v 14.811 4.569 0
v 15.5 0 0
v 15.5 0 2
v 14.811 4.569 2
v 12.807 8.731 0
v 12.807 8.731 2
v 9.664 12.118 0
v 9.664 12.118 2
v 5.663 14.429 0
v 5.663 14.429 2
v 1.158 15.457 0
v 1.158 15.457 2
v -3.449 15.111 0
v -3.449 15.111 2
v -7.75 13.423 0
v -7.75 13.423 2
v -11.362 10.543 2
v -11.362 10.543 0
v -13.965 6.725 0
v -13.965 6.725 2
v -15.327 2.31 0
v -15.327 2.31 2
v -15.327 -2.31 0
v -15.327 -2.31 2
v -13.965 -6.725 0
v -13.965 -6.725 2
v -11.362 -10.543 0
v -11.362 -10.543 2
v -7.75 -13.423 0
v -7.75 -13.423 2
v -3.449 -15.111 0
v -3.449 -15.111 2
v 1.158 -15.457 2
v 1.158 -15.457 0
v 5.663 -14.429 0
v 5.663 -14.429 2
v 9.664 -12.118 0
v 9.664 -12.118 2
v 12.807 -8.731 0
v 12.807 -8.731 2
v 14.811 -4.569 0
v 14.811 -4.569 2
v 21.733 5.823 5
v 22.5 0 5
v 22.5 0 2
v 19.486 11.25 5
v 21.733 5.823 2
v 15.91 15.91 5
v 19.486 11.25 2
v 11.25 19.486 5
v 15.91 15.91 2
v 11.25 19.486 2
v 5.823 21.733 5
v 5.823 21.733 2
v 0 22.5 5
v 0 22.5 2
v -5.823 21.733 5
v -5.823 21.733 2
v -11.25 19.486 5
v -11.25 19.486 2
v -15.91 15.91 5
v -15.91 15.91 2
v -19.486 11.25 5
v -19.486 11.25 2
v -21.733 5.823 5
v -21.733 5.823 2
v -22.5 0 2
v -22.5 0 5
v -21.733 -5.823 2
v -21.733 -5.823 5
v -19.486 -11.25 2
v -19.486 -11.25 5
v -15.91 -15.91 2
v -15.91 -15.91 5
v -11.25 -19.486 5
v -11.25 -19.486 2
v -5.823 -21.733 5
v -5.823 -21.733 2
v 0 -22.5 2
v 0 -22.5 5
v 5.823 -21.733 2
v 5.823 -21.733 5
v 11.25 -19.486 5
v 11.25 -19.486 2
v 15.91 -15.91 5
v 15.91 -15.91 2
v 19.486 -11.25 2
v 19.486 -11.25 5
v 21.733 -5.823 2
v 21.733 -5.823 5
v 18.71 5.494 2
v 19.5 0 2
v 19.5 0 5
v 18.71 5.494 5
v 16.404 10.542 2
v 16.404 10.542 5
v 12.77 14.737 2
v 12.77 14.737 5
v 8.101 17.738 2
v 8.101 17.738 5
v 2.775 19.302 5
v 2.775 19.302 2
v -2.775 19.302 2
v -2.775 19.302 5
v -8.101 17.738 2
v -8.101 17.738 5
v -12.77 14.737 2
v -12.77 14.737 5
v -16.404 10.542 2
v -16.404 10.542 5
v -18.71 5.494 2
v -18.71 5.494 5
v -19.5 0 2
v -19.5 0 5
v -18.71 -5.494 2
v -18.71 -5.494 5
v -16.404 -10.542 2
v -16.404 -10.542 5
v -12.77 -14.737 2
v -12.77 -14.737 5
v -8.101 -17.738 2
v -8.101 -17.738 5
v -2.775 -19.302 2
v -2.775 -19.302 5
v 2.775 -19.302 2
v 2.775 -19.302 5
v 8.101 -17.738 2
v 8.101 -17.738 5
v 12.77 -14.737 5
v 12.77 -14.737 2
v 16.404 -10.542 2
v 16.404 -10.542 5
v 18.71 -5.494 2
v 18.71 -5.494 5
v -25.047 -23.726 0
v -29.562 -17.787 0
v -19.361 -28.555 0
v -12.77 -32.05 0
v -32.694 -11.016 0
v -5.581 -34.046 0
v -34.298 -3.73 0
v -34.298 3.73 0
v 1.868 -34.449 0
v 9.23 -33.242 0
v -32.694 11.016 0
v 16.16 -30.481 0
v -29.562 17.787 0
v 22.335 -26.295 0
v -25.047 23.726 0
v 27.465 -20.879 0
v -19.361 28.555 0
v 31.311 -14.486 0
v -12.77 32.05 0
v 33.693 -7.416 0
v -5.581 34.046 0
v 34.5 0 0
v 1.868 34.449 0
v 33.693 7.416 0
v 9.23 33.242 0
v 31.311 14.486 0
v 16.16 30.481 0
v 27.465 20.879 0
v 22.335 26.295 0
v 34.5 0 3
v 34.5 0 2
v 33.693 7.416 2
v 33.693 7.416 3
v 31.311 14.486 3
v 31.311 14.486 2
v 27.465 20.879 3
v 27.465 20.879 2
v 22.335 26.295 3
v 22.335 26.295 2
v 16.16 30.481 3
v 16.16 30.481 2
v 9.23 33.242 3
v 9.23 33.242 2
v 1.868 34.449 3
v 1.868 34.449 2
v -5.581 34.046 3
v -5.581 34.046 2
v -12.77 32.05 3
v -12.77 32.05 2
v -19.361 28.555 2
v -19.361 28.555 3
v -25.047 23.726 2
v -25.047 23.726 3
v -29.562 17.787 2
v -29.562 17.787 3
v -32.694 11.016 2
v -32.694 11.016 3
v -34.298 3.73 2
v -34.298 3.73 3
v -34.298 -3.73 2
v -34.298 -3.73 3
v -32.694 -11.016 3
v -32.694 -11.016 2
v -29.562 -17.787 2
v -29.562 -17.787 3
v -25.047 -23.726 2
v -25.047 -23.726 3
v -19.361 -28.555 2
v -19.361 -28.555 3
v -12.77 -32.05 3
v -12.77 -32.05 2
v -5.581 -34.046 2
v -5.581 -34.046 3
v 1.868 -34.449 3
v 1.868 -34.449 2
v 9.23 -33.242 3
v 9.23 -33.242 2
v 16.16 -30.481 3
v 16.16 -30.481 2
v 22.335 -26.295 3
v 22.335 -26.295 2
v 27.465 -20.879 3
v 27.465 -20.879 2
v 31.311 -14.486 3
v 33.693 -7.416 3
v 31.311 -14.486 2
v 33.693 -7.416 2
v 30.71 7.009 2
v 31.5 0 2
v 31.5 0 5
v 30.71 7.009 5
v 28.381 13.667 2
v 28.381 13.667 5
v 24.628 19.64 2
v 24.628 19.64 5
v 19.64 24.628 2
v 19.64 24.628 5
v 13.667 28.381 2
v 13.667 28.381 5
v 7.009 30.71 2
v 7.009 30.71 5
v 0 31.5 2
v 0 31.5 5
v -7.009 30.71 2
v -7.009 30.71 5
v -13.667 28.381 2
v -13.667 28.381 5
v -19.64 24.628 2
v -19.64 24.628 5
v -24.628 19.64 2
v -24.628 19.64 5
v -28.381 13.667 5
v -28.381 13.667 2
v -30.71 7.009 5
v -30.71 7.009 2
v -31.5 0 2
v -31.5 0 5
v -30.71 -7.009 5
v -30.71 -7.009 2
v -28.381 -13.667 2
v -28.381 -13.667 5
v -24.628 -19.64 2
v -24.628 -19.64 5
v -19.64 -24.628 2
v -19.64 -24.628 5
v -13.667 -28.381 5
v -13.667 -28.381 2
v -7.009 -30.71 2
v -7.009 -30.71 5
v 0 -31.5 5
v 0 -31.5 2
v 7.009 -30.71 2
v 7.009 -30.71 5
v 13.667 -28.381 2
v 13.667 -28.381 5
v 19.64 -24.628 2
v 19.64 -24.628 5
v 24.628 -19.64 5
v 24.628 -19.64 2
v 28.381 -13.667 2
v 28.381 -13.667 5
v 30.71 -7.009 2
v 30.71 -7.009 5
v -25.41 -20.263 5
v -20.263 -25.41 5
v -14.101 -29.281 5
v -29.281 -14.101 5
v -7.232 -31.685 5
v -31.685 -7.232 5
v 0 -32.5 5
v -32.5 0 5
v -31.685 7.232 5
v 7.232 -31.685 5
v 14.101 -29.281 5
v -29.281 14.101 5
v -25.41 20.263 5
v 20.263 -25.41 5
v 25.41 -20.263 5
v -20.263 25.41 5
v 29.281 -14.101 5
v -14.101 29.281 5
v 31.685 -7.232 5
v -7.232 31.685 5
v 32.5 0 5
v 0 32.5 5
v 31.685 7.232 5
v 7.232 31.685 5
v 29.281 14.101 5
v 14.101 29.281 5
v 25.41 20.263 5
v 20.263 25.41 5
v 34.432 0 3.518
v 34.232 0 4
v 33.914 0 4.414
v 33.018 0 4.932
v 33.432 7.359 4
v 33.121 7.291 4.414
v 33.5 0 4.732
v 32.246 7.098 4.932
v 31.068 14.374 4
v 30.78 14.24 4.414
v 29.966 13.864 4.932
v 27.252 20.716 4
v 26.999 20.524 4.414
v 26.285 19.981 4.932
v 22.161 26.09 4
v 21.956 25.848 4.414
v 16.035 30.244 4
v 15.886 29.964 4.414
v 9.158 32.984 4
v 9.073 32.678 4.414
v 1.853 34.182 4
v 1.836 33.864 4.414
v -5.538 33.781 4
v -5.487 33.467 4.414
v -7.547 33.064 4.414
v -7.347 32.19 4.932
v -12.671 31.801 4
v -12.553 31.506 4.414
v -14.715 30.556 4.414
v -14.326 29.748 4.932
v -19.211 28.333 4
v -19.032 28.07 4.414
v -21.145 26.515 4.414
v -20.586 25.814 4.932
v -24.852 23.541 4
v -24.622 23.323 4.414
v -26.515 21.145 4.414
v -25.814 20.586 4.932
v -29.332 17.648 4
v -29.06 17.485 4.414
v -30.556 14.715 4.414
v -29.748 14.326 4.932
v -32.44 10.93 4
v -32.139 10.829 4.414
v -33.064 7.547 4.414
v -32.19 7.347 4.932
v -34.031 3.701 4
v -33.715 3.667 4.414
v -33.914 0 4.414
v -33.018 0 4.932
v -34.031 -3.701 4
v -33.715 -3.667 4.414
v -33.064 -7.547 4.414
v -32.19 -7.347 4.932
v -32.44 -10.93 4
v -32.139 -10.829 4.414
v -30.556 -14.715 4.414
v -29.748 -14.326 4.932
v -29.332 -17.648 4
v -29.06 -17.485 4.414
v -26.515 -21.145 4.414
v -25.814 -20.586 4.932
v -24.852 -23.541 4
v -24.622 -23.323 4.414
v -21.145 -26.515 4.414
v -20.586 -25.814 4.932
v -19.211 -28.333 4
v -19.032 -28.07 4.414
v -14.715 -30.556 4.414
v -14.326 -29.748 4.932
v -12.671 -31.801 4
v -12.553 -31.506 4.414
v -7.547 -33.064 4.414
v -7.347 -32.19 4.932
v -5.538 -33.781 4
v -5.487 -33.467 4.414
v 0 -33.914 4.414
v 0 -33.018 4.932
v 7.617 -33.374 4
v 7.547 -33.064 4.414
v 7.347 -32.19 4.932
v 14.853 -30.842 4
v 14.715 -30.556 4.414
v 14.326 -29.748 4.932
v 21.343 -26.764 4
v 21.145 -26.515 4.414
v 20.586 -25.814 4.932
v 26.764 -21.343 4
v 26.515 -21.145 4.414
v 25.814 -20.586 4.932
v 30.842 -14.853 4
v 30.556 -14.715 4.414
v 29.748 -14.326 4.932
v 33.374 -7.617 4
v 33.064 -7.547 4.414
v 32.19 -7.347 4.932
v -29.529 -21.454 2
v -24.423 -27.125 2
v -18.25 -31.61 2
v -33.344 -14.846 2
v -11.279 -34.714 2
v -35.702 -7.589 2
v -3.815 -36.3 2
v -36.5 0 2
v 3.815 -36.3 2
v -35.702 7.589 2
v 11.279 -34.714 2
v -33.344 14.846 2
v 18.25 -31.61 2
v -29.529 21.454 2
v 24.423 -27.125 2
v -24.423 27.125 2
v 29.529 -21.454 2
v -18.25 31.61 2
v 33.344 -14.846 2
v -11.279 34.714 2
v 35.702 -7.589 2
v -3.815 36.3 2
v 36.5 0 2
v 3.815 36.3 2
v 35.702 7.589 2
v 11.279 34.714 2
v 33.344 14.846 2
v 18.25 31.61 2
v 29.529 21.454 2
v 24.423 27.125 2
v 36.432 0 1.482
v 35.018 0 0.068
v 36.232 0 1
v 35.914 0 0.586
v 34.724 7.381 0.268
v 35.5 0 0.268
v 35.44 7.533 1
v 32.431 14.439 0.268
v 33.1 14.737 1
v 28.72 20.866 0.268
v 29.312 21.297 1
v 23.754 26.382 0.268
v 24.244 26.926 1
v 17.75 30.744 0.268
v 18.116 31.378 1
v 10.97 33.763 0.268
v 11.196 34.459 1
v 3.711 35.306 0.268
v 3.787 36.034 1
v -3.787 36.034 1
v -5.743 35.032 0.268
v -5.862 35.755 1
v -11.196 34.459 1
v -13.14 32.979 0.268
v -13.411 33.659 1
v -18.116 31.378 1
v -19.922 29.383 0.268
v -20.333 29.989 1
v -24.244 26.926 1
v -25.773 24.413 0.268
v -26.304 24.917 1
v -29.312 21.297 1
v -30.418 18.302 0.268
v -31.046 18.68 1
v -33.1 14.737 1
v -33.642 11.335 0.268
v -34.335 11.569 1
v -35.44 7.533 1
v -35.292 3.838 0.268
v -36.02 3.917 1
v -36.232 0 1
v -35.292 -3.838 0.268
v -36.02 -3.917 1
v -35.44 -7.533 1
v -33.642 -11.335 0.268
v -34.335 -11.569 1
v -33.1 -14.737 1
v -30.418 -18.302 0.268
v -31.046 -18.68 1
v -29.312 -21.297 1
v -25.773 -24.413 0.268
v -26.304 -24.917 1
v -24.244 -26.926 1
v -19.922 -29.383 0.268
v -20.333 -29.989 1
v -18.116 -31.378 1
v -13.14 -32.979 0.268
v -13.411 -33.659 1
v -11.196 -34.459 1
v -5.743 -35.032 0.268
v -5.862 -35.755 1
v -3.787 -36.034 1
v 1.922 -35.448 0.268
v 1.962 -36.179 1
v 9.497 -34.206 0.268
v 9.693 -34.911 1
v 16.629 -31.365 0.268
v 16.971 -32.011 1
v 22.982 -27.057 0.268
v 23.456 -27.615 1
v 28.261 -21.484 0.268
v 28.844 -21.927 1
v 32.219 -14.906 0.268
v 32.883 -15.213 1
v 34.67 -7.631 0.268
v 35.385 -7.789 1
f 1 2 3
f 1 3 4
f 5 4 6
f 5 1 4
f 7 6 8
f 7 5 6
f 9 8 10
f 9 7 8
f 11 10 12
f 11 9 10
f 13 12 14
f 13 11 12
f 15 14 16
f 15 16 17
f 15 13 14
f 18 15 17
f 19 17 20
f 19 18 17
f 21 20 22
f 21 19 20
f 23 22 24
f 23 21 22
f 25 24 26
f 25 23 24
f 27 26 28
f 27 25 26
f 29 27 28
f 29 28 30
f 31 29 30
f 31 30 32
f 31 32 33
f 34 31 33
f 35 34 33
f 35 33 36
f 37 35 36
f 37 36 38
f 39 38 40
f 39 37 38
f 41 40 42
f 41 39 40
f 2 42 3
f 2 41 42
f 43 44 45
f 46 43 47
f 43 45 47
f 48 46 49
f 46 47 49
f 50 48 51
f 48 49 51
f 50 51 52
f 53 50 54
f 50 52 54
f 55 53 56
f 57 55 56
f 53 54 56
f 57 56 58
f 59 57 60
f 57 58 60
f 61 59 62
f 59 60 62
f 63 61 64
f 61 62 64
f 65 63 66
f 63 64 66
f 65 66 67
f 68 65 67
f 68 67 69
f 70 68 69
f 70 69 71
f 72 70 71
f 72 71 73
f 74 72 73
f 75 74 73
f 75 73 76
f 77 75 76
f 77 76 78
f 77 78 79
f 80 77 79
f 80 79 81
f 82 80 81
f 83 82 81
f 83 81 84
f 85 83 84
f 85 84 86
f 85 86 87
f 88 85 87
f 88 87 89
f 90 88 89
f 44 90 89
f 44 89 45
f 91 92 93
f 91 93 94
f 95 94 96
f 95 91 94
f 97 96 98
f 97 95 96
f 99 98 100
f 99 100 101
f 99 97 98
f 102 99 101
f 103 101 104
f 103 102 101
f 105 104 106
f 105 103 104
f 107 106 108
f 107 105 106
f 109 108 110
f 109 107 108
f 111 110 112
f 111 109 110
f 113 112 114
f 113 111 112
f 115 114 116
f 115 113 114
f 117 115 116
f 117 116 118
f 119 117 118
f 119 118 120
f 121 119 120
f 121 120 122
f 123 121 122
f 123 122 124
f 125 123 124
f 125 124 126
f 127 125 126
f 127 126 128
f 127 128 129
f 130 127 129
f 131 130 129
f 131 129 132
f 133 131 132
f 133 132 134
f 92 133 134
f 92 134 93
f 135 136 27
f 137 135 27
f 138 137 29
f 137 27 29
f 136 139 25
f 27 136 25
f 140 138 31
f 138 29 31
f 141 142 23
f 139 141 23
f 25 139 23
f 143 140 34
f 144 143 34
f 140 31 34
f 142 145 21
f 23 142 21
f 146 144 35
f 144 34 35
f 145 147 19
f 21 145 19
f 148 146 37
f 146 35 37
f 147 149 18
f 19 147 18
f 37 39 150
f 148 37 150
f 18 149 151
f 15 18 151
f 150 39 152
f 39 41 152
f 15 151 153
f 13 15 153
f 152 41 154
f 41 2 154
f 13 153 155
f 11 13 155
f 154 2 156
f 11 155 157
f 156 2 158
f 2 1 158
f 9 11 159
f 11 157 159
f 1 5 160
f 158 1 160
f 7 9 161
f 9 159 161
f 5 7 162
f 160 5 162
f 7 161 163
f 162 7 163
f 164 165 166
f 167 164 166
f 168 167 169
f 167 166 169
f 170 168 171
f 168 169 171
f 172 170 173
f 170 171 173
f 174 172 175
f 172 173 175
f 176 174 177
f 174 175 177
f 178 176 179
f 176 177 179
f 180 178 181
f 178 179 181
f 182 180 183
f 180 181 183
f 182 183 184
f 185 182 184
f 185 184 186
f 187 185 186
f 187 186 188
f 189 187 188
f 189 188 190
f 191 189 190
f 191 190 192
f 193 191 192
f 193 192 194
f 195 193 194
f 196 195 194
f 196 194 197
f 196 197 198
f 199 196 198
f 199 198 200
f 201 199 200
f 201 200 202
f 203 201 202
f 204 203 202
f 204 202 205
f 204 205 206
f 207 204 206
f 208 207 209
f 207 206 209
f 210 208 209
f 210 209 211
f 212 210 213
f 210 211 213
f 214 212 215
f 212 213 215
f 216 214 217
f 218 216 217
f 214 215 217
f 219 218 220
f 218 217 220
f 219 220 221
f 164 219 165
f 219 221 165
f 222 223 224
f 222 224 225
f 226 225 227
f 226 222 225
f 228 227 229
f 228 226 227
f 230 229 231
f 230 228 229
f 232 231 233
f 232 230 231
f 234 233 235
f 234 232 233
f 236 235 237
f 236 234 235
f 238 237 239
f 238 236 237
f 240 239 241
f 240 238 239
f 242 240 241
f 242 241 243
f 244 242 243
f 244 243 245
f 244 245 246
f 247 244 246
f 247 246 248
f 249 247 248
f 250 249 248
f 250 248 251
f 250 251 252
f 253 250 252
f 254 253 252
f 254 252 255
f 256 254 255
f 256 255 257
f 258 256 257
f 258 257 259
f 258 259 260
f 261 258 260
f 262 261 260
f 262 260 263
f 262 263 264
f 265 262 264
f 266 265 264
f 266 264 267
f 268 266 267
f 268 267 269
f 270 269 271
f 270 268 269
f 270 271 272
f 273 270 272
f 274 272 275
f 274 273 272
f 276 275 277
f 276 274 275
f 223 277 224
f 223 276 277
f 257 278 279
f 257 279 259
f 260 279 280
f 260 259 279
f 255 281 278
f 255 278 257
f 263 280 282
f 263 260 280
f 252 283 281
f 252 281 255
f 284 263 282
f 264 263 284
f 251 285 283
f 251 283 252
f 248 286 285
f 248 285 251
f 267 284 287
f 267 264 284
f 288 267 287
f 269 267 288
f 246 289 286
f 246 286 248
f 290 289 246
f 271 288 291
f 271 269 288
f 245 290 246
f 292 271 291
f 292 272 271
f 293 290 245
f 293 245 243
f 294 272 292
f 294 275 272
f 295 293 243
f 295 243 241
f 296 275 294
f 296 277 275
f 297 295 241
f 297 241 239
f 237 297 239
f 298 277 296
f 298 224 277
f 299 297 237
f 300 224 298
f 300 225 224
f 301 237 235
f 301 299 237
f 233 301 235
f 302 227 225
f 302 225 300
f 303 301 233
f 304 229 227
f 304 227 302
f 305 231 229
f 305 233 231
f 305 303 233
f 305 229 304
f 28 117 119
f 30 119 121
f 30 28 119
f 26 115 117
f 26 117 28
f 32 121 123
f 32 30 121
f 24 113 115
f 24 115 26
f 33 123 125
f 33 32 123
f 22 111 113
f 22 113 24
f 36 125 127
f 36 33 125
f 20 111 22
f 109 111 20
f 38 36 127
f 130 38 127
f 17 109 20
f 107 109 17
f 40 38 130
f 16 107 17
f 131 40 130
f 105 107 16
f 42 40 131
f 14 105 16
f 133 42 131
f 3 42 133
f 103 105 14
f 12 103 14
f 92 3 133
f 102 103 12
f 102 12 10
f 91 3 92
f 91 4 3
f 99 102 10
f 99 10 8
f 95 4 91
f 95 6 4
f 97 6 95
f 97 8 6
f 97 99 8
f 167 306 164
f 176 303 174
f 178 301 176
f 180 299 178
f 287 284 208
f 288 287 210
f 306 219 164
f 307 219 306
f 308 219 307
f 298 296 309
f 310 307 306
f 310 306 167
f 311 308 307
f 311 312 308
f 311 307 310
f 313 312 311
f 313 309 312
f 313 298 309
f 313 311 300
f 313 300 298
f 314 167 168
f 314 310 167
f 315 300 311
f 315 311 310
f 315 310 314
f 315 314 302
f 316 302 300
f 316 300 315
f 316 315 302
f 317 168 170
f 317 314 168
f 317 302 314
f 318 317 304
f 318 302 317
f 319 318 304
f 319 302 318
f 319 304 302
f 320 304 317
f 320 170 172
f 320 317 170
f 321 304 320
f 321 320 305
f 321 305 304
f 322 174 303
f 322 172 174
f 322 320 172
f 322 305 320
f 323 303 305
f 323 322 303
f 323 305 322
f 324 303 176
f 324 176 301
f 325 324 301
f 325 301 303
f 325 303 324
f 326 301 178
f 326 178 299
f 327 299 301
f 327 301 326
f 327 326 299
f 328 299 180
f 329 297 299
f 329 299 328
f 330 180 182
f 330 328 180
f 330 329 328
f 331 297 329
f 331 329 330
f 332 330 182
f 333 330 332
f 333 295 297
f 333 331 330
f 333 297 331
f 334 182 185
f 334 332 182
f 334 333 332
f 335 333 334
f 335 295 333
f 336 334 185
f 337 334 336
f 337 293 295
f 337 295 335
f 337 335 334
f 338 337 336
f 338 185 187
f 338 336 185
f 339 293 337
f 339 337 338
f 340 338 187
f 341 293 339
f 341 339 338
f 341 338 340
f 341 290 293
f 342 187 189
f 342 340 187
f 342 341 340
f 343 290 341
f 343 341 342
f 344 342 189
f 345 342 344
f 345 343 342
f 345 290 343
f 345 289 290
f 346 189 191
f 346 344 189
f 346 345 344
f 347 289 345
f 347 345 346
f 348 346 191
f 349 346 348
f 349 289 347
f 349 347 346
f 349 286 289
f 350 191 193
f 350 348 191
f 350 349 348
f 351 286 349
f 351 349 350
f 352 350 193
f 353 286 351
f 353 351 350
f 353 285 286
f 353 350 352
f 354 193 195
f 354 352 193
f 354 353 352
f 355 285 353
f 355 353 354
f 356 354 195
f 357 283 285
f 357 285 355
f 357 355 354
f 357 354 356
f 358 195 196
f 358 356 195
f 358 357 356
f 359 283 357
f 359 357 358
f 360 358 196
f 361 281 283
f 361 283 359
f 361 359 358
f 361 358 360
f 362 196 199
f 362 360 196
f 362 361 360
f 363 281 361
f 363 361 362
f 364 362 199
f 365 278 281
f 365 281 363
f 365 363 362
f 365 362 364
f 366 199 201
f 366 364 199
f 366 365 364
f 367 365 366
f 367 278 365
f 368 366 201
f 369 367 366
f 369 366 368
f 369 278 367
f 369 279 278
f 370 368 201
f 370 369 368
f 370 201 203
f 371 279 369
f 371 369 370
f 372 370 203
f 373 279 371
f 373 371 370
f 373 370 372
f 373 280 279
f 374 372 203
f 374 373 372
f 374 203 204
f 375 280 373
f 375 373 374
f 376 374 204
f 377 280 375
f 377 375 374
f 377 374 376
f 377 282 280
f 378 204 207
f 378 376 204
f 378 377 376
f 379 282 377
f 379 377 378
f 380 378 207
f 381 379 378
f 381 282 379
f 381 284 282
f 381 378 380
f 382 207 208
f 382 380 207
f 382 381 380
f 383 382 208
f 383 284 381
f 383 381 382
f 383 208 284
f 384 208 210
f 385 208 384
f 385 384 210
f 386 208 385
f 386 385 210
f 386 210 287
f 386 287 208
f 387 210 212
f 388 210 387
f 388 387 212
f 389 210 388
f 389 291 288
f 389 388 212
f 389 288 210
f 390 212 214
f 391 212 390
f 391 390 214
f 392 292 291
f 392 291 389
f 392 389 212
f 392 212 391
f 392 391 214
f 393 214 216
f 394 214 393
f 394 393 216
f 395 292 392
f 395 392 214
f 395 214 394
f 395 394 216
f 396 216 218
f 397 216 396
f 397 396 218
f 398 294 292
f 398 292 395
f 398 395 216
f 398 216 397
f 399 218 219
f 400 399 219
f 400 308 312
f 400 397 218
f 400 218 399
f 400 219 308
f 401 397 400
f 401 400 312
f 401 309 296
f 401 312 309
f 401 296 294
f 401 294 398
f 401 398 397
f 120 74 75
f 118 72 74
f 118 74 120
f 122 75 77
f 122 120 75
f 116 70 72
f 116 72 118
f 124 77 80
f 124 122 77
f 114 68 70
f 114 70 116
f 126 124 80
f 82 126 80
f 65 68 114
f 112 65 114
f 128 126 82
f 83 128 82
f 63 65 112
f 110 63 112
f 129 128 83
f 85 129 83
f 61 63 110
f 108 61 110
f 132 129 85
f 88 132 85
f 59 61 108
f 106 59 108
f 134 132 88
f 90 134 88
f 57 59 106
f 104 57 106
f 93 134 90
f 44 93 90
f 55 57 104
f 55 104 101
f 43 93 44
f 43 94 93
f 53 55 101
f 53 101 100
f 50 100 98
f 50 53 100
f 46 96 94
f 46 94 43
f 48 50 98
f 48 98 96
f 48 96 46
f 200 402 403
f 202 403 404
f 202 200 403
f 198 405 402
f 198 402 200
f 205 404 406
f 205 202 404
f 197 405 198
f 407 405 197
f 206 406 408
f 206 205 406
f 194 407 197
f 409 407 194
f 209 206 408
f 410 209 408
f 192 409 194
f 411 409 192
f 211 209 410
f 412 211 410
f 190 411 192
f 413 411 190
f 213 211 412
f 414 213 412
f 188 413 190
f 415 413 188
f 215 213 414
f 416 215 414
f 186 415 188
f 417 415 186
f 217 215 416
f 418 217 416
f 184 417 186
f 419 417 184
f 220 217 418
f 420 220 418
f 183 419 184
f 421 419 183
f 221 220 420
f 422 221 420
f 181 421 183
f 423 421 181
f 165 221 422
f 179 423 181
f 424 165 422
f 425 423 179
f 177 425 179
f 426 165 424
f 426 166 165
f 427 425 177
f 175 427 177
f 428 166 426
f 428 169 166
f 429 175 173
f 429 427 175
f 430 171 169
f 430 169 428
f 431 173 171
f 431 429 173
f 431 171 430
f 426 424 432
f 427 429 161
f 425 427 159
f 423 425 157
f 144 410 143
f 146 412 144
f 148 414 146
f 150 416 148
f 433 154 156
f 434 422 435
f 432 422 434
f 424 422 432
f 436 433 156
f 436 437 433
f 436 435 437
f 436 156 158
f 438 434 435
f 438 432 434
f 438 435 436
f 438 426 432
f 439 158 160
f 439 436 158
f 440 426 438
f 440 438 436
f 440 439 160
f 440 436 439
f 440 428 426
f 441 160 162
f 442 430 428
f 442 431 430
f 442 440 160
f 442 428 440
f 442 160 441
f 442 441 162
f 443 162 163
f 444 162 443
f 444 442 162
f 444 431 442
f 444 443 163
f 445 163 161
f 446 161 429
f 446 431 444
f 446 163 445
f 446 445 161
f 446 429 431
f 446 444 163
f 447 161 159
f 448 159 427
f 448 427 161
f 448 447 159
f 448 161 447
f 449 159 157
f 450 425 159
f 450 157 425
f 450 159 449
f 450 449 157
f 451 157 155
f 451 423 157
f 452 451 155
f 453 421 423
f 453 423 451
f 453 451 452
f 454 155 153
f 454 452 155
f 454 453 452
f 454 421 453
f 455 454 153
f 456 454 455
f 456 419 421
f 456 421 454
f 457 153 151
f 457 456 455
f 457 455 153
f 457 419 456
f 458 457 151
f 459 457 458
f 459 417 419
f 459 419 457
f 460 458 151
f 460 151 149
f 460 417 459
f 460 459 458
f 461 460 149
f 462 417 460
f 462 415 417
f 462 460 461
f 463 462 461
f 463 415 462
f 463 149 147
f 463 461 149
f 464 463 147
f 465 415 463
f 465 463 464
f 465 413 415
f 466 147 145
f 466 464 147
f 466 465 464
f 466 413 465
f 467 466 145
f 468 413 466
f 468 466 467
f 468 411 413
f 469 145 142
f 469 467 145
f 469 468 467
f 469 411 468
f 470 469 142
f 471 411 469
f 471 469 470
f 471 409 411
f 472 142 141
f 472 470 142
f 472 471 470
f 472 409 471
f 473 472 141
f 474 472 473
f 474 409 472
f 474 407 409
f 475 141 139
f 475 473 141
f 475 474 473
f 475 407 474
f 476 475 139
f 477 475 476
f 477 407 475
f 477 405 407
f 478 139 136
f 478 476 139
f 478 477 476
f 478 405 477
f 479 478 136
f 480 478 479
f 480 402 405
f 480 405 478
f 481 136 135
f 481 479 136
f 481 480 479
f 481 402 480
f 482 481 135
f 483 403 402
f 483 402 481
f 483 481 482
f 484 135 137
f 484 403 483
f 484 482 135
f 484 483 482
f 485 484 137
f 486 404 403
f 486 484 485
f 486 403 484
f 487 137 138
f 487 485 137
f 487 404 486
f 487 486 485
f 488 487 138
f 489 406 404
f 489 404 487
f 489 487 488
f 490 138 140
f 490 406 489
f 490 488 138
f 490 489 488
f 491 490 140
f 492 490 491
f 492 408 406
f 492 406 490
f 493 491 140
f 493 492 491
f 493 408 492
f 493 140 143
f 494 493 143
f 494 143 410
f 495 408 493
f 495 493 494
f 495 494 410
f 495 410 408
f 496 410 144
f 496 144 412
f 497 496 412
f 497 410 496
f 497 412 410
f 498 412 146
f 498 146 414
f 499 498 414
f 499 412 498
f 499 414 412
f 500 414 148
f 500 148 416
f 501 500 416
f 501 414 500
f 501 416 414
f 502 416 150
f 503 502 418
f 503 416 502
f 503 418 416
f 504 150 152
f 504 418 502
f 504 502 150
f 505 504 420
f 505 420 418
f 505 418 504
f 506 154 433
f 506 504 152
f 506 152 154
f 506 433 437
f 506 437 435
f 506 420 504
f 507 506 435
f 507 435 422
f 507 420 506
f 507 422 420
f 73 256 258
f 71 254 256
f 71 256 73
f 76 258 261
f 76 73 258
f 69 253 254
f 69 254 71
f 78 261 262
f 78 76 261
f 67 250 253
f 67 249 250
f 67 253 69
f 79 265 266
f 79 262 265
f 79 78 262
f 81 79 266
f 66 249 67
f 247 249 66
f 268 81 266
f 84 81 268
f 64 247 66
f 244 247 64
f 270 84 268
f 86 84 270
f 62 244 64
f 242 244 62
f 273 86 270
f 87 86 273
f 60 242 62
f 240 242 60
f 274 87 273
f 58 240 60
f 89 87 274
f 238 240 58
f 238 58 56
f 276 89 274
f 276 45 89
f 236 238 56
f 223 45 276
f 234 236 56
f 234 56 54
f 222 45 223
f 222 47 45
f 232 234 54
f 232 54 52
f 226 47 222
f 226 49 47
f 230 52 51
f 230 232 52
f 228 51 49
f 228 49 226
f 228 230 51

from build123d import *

# Parameters (mm, degrees)
F0_R     = 36.5
F0_R_2   = 34.5
F0_R_3   = 31.5
F0_R_4   = 22.5
F0_R_5   = 19.5
F1_DEPTH = 2
F2_DEPTH = 5
F3_R     = 1.99999
F4_R     = 2
F0_R_6   = 15.5
F5_DEPTH = 2


# Not quite as in the source:
# - a fillet or chamfer is up to 0.001 mm smaller than in the source, because OpenCascade refuses the exact size


with BuildPart() as f1:
    # F0 (on Top) → F1 (new body)
    with BuildSketch(Plane.XY):
        Circle(F0_R)
        Circle(F0_R_2, mode=Mode.SUBTRACT)
        Circle(F0_R_2)
        Circle(F0_R_3, mode=Mode.SUBTRACT)
        Circle(F0_R_3)
        Circle(F0_R_4, mode=Mode.SUBTRACT)
        Circle(F0_R_4)
        Circle(F0_R_5, mode=Mode.SUBTRACT)
    extrude(amount=F1_DEPTH)

    # F0 (on Top) → F2 (join)
    with BuildSketch(Plane.XY):
        Circle(F0_R_2)
        Circle(F0_R_3, mode=Mode.SUBTRACT)
        Circle(F0_R_4)
        Circle(F0_R_5, mode=Mode.SUBTRACT)
    extrude(amount=F2_DEPTH)

    # F3 (radius 2 in the source; OpenCascade refuses exactly that, so slightly less here)
    f3_edges = [f1.edges().sort_by_distance(p)[0] for p in [
        (-36.5, 0, 0),
    ]]
    fillet(f3_edges, radius=F3_R)

    # F4
    f4_edges = [f1.edges().sort_by_distance(p)[0] for p in [
        (-34.5, 0, 5),
    ]]
    fillet(f4_edges, radius=F4_R)

    # F0 (on Top) → F5 (join)
    with BuildSketch(Plane.XY):
        Circle(F0_R_5)
        Circle(F0_R_6, mode=Mode.SUBTRACT)
    extrude(amount=F5_DEPTH)


solid = f1.part
